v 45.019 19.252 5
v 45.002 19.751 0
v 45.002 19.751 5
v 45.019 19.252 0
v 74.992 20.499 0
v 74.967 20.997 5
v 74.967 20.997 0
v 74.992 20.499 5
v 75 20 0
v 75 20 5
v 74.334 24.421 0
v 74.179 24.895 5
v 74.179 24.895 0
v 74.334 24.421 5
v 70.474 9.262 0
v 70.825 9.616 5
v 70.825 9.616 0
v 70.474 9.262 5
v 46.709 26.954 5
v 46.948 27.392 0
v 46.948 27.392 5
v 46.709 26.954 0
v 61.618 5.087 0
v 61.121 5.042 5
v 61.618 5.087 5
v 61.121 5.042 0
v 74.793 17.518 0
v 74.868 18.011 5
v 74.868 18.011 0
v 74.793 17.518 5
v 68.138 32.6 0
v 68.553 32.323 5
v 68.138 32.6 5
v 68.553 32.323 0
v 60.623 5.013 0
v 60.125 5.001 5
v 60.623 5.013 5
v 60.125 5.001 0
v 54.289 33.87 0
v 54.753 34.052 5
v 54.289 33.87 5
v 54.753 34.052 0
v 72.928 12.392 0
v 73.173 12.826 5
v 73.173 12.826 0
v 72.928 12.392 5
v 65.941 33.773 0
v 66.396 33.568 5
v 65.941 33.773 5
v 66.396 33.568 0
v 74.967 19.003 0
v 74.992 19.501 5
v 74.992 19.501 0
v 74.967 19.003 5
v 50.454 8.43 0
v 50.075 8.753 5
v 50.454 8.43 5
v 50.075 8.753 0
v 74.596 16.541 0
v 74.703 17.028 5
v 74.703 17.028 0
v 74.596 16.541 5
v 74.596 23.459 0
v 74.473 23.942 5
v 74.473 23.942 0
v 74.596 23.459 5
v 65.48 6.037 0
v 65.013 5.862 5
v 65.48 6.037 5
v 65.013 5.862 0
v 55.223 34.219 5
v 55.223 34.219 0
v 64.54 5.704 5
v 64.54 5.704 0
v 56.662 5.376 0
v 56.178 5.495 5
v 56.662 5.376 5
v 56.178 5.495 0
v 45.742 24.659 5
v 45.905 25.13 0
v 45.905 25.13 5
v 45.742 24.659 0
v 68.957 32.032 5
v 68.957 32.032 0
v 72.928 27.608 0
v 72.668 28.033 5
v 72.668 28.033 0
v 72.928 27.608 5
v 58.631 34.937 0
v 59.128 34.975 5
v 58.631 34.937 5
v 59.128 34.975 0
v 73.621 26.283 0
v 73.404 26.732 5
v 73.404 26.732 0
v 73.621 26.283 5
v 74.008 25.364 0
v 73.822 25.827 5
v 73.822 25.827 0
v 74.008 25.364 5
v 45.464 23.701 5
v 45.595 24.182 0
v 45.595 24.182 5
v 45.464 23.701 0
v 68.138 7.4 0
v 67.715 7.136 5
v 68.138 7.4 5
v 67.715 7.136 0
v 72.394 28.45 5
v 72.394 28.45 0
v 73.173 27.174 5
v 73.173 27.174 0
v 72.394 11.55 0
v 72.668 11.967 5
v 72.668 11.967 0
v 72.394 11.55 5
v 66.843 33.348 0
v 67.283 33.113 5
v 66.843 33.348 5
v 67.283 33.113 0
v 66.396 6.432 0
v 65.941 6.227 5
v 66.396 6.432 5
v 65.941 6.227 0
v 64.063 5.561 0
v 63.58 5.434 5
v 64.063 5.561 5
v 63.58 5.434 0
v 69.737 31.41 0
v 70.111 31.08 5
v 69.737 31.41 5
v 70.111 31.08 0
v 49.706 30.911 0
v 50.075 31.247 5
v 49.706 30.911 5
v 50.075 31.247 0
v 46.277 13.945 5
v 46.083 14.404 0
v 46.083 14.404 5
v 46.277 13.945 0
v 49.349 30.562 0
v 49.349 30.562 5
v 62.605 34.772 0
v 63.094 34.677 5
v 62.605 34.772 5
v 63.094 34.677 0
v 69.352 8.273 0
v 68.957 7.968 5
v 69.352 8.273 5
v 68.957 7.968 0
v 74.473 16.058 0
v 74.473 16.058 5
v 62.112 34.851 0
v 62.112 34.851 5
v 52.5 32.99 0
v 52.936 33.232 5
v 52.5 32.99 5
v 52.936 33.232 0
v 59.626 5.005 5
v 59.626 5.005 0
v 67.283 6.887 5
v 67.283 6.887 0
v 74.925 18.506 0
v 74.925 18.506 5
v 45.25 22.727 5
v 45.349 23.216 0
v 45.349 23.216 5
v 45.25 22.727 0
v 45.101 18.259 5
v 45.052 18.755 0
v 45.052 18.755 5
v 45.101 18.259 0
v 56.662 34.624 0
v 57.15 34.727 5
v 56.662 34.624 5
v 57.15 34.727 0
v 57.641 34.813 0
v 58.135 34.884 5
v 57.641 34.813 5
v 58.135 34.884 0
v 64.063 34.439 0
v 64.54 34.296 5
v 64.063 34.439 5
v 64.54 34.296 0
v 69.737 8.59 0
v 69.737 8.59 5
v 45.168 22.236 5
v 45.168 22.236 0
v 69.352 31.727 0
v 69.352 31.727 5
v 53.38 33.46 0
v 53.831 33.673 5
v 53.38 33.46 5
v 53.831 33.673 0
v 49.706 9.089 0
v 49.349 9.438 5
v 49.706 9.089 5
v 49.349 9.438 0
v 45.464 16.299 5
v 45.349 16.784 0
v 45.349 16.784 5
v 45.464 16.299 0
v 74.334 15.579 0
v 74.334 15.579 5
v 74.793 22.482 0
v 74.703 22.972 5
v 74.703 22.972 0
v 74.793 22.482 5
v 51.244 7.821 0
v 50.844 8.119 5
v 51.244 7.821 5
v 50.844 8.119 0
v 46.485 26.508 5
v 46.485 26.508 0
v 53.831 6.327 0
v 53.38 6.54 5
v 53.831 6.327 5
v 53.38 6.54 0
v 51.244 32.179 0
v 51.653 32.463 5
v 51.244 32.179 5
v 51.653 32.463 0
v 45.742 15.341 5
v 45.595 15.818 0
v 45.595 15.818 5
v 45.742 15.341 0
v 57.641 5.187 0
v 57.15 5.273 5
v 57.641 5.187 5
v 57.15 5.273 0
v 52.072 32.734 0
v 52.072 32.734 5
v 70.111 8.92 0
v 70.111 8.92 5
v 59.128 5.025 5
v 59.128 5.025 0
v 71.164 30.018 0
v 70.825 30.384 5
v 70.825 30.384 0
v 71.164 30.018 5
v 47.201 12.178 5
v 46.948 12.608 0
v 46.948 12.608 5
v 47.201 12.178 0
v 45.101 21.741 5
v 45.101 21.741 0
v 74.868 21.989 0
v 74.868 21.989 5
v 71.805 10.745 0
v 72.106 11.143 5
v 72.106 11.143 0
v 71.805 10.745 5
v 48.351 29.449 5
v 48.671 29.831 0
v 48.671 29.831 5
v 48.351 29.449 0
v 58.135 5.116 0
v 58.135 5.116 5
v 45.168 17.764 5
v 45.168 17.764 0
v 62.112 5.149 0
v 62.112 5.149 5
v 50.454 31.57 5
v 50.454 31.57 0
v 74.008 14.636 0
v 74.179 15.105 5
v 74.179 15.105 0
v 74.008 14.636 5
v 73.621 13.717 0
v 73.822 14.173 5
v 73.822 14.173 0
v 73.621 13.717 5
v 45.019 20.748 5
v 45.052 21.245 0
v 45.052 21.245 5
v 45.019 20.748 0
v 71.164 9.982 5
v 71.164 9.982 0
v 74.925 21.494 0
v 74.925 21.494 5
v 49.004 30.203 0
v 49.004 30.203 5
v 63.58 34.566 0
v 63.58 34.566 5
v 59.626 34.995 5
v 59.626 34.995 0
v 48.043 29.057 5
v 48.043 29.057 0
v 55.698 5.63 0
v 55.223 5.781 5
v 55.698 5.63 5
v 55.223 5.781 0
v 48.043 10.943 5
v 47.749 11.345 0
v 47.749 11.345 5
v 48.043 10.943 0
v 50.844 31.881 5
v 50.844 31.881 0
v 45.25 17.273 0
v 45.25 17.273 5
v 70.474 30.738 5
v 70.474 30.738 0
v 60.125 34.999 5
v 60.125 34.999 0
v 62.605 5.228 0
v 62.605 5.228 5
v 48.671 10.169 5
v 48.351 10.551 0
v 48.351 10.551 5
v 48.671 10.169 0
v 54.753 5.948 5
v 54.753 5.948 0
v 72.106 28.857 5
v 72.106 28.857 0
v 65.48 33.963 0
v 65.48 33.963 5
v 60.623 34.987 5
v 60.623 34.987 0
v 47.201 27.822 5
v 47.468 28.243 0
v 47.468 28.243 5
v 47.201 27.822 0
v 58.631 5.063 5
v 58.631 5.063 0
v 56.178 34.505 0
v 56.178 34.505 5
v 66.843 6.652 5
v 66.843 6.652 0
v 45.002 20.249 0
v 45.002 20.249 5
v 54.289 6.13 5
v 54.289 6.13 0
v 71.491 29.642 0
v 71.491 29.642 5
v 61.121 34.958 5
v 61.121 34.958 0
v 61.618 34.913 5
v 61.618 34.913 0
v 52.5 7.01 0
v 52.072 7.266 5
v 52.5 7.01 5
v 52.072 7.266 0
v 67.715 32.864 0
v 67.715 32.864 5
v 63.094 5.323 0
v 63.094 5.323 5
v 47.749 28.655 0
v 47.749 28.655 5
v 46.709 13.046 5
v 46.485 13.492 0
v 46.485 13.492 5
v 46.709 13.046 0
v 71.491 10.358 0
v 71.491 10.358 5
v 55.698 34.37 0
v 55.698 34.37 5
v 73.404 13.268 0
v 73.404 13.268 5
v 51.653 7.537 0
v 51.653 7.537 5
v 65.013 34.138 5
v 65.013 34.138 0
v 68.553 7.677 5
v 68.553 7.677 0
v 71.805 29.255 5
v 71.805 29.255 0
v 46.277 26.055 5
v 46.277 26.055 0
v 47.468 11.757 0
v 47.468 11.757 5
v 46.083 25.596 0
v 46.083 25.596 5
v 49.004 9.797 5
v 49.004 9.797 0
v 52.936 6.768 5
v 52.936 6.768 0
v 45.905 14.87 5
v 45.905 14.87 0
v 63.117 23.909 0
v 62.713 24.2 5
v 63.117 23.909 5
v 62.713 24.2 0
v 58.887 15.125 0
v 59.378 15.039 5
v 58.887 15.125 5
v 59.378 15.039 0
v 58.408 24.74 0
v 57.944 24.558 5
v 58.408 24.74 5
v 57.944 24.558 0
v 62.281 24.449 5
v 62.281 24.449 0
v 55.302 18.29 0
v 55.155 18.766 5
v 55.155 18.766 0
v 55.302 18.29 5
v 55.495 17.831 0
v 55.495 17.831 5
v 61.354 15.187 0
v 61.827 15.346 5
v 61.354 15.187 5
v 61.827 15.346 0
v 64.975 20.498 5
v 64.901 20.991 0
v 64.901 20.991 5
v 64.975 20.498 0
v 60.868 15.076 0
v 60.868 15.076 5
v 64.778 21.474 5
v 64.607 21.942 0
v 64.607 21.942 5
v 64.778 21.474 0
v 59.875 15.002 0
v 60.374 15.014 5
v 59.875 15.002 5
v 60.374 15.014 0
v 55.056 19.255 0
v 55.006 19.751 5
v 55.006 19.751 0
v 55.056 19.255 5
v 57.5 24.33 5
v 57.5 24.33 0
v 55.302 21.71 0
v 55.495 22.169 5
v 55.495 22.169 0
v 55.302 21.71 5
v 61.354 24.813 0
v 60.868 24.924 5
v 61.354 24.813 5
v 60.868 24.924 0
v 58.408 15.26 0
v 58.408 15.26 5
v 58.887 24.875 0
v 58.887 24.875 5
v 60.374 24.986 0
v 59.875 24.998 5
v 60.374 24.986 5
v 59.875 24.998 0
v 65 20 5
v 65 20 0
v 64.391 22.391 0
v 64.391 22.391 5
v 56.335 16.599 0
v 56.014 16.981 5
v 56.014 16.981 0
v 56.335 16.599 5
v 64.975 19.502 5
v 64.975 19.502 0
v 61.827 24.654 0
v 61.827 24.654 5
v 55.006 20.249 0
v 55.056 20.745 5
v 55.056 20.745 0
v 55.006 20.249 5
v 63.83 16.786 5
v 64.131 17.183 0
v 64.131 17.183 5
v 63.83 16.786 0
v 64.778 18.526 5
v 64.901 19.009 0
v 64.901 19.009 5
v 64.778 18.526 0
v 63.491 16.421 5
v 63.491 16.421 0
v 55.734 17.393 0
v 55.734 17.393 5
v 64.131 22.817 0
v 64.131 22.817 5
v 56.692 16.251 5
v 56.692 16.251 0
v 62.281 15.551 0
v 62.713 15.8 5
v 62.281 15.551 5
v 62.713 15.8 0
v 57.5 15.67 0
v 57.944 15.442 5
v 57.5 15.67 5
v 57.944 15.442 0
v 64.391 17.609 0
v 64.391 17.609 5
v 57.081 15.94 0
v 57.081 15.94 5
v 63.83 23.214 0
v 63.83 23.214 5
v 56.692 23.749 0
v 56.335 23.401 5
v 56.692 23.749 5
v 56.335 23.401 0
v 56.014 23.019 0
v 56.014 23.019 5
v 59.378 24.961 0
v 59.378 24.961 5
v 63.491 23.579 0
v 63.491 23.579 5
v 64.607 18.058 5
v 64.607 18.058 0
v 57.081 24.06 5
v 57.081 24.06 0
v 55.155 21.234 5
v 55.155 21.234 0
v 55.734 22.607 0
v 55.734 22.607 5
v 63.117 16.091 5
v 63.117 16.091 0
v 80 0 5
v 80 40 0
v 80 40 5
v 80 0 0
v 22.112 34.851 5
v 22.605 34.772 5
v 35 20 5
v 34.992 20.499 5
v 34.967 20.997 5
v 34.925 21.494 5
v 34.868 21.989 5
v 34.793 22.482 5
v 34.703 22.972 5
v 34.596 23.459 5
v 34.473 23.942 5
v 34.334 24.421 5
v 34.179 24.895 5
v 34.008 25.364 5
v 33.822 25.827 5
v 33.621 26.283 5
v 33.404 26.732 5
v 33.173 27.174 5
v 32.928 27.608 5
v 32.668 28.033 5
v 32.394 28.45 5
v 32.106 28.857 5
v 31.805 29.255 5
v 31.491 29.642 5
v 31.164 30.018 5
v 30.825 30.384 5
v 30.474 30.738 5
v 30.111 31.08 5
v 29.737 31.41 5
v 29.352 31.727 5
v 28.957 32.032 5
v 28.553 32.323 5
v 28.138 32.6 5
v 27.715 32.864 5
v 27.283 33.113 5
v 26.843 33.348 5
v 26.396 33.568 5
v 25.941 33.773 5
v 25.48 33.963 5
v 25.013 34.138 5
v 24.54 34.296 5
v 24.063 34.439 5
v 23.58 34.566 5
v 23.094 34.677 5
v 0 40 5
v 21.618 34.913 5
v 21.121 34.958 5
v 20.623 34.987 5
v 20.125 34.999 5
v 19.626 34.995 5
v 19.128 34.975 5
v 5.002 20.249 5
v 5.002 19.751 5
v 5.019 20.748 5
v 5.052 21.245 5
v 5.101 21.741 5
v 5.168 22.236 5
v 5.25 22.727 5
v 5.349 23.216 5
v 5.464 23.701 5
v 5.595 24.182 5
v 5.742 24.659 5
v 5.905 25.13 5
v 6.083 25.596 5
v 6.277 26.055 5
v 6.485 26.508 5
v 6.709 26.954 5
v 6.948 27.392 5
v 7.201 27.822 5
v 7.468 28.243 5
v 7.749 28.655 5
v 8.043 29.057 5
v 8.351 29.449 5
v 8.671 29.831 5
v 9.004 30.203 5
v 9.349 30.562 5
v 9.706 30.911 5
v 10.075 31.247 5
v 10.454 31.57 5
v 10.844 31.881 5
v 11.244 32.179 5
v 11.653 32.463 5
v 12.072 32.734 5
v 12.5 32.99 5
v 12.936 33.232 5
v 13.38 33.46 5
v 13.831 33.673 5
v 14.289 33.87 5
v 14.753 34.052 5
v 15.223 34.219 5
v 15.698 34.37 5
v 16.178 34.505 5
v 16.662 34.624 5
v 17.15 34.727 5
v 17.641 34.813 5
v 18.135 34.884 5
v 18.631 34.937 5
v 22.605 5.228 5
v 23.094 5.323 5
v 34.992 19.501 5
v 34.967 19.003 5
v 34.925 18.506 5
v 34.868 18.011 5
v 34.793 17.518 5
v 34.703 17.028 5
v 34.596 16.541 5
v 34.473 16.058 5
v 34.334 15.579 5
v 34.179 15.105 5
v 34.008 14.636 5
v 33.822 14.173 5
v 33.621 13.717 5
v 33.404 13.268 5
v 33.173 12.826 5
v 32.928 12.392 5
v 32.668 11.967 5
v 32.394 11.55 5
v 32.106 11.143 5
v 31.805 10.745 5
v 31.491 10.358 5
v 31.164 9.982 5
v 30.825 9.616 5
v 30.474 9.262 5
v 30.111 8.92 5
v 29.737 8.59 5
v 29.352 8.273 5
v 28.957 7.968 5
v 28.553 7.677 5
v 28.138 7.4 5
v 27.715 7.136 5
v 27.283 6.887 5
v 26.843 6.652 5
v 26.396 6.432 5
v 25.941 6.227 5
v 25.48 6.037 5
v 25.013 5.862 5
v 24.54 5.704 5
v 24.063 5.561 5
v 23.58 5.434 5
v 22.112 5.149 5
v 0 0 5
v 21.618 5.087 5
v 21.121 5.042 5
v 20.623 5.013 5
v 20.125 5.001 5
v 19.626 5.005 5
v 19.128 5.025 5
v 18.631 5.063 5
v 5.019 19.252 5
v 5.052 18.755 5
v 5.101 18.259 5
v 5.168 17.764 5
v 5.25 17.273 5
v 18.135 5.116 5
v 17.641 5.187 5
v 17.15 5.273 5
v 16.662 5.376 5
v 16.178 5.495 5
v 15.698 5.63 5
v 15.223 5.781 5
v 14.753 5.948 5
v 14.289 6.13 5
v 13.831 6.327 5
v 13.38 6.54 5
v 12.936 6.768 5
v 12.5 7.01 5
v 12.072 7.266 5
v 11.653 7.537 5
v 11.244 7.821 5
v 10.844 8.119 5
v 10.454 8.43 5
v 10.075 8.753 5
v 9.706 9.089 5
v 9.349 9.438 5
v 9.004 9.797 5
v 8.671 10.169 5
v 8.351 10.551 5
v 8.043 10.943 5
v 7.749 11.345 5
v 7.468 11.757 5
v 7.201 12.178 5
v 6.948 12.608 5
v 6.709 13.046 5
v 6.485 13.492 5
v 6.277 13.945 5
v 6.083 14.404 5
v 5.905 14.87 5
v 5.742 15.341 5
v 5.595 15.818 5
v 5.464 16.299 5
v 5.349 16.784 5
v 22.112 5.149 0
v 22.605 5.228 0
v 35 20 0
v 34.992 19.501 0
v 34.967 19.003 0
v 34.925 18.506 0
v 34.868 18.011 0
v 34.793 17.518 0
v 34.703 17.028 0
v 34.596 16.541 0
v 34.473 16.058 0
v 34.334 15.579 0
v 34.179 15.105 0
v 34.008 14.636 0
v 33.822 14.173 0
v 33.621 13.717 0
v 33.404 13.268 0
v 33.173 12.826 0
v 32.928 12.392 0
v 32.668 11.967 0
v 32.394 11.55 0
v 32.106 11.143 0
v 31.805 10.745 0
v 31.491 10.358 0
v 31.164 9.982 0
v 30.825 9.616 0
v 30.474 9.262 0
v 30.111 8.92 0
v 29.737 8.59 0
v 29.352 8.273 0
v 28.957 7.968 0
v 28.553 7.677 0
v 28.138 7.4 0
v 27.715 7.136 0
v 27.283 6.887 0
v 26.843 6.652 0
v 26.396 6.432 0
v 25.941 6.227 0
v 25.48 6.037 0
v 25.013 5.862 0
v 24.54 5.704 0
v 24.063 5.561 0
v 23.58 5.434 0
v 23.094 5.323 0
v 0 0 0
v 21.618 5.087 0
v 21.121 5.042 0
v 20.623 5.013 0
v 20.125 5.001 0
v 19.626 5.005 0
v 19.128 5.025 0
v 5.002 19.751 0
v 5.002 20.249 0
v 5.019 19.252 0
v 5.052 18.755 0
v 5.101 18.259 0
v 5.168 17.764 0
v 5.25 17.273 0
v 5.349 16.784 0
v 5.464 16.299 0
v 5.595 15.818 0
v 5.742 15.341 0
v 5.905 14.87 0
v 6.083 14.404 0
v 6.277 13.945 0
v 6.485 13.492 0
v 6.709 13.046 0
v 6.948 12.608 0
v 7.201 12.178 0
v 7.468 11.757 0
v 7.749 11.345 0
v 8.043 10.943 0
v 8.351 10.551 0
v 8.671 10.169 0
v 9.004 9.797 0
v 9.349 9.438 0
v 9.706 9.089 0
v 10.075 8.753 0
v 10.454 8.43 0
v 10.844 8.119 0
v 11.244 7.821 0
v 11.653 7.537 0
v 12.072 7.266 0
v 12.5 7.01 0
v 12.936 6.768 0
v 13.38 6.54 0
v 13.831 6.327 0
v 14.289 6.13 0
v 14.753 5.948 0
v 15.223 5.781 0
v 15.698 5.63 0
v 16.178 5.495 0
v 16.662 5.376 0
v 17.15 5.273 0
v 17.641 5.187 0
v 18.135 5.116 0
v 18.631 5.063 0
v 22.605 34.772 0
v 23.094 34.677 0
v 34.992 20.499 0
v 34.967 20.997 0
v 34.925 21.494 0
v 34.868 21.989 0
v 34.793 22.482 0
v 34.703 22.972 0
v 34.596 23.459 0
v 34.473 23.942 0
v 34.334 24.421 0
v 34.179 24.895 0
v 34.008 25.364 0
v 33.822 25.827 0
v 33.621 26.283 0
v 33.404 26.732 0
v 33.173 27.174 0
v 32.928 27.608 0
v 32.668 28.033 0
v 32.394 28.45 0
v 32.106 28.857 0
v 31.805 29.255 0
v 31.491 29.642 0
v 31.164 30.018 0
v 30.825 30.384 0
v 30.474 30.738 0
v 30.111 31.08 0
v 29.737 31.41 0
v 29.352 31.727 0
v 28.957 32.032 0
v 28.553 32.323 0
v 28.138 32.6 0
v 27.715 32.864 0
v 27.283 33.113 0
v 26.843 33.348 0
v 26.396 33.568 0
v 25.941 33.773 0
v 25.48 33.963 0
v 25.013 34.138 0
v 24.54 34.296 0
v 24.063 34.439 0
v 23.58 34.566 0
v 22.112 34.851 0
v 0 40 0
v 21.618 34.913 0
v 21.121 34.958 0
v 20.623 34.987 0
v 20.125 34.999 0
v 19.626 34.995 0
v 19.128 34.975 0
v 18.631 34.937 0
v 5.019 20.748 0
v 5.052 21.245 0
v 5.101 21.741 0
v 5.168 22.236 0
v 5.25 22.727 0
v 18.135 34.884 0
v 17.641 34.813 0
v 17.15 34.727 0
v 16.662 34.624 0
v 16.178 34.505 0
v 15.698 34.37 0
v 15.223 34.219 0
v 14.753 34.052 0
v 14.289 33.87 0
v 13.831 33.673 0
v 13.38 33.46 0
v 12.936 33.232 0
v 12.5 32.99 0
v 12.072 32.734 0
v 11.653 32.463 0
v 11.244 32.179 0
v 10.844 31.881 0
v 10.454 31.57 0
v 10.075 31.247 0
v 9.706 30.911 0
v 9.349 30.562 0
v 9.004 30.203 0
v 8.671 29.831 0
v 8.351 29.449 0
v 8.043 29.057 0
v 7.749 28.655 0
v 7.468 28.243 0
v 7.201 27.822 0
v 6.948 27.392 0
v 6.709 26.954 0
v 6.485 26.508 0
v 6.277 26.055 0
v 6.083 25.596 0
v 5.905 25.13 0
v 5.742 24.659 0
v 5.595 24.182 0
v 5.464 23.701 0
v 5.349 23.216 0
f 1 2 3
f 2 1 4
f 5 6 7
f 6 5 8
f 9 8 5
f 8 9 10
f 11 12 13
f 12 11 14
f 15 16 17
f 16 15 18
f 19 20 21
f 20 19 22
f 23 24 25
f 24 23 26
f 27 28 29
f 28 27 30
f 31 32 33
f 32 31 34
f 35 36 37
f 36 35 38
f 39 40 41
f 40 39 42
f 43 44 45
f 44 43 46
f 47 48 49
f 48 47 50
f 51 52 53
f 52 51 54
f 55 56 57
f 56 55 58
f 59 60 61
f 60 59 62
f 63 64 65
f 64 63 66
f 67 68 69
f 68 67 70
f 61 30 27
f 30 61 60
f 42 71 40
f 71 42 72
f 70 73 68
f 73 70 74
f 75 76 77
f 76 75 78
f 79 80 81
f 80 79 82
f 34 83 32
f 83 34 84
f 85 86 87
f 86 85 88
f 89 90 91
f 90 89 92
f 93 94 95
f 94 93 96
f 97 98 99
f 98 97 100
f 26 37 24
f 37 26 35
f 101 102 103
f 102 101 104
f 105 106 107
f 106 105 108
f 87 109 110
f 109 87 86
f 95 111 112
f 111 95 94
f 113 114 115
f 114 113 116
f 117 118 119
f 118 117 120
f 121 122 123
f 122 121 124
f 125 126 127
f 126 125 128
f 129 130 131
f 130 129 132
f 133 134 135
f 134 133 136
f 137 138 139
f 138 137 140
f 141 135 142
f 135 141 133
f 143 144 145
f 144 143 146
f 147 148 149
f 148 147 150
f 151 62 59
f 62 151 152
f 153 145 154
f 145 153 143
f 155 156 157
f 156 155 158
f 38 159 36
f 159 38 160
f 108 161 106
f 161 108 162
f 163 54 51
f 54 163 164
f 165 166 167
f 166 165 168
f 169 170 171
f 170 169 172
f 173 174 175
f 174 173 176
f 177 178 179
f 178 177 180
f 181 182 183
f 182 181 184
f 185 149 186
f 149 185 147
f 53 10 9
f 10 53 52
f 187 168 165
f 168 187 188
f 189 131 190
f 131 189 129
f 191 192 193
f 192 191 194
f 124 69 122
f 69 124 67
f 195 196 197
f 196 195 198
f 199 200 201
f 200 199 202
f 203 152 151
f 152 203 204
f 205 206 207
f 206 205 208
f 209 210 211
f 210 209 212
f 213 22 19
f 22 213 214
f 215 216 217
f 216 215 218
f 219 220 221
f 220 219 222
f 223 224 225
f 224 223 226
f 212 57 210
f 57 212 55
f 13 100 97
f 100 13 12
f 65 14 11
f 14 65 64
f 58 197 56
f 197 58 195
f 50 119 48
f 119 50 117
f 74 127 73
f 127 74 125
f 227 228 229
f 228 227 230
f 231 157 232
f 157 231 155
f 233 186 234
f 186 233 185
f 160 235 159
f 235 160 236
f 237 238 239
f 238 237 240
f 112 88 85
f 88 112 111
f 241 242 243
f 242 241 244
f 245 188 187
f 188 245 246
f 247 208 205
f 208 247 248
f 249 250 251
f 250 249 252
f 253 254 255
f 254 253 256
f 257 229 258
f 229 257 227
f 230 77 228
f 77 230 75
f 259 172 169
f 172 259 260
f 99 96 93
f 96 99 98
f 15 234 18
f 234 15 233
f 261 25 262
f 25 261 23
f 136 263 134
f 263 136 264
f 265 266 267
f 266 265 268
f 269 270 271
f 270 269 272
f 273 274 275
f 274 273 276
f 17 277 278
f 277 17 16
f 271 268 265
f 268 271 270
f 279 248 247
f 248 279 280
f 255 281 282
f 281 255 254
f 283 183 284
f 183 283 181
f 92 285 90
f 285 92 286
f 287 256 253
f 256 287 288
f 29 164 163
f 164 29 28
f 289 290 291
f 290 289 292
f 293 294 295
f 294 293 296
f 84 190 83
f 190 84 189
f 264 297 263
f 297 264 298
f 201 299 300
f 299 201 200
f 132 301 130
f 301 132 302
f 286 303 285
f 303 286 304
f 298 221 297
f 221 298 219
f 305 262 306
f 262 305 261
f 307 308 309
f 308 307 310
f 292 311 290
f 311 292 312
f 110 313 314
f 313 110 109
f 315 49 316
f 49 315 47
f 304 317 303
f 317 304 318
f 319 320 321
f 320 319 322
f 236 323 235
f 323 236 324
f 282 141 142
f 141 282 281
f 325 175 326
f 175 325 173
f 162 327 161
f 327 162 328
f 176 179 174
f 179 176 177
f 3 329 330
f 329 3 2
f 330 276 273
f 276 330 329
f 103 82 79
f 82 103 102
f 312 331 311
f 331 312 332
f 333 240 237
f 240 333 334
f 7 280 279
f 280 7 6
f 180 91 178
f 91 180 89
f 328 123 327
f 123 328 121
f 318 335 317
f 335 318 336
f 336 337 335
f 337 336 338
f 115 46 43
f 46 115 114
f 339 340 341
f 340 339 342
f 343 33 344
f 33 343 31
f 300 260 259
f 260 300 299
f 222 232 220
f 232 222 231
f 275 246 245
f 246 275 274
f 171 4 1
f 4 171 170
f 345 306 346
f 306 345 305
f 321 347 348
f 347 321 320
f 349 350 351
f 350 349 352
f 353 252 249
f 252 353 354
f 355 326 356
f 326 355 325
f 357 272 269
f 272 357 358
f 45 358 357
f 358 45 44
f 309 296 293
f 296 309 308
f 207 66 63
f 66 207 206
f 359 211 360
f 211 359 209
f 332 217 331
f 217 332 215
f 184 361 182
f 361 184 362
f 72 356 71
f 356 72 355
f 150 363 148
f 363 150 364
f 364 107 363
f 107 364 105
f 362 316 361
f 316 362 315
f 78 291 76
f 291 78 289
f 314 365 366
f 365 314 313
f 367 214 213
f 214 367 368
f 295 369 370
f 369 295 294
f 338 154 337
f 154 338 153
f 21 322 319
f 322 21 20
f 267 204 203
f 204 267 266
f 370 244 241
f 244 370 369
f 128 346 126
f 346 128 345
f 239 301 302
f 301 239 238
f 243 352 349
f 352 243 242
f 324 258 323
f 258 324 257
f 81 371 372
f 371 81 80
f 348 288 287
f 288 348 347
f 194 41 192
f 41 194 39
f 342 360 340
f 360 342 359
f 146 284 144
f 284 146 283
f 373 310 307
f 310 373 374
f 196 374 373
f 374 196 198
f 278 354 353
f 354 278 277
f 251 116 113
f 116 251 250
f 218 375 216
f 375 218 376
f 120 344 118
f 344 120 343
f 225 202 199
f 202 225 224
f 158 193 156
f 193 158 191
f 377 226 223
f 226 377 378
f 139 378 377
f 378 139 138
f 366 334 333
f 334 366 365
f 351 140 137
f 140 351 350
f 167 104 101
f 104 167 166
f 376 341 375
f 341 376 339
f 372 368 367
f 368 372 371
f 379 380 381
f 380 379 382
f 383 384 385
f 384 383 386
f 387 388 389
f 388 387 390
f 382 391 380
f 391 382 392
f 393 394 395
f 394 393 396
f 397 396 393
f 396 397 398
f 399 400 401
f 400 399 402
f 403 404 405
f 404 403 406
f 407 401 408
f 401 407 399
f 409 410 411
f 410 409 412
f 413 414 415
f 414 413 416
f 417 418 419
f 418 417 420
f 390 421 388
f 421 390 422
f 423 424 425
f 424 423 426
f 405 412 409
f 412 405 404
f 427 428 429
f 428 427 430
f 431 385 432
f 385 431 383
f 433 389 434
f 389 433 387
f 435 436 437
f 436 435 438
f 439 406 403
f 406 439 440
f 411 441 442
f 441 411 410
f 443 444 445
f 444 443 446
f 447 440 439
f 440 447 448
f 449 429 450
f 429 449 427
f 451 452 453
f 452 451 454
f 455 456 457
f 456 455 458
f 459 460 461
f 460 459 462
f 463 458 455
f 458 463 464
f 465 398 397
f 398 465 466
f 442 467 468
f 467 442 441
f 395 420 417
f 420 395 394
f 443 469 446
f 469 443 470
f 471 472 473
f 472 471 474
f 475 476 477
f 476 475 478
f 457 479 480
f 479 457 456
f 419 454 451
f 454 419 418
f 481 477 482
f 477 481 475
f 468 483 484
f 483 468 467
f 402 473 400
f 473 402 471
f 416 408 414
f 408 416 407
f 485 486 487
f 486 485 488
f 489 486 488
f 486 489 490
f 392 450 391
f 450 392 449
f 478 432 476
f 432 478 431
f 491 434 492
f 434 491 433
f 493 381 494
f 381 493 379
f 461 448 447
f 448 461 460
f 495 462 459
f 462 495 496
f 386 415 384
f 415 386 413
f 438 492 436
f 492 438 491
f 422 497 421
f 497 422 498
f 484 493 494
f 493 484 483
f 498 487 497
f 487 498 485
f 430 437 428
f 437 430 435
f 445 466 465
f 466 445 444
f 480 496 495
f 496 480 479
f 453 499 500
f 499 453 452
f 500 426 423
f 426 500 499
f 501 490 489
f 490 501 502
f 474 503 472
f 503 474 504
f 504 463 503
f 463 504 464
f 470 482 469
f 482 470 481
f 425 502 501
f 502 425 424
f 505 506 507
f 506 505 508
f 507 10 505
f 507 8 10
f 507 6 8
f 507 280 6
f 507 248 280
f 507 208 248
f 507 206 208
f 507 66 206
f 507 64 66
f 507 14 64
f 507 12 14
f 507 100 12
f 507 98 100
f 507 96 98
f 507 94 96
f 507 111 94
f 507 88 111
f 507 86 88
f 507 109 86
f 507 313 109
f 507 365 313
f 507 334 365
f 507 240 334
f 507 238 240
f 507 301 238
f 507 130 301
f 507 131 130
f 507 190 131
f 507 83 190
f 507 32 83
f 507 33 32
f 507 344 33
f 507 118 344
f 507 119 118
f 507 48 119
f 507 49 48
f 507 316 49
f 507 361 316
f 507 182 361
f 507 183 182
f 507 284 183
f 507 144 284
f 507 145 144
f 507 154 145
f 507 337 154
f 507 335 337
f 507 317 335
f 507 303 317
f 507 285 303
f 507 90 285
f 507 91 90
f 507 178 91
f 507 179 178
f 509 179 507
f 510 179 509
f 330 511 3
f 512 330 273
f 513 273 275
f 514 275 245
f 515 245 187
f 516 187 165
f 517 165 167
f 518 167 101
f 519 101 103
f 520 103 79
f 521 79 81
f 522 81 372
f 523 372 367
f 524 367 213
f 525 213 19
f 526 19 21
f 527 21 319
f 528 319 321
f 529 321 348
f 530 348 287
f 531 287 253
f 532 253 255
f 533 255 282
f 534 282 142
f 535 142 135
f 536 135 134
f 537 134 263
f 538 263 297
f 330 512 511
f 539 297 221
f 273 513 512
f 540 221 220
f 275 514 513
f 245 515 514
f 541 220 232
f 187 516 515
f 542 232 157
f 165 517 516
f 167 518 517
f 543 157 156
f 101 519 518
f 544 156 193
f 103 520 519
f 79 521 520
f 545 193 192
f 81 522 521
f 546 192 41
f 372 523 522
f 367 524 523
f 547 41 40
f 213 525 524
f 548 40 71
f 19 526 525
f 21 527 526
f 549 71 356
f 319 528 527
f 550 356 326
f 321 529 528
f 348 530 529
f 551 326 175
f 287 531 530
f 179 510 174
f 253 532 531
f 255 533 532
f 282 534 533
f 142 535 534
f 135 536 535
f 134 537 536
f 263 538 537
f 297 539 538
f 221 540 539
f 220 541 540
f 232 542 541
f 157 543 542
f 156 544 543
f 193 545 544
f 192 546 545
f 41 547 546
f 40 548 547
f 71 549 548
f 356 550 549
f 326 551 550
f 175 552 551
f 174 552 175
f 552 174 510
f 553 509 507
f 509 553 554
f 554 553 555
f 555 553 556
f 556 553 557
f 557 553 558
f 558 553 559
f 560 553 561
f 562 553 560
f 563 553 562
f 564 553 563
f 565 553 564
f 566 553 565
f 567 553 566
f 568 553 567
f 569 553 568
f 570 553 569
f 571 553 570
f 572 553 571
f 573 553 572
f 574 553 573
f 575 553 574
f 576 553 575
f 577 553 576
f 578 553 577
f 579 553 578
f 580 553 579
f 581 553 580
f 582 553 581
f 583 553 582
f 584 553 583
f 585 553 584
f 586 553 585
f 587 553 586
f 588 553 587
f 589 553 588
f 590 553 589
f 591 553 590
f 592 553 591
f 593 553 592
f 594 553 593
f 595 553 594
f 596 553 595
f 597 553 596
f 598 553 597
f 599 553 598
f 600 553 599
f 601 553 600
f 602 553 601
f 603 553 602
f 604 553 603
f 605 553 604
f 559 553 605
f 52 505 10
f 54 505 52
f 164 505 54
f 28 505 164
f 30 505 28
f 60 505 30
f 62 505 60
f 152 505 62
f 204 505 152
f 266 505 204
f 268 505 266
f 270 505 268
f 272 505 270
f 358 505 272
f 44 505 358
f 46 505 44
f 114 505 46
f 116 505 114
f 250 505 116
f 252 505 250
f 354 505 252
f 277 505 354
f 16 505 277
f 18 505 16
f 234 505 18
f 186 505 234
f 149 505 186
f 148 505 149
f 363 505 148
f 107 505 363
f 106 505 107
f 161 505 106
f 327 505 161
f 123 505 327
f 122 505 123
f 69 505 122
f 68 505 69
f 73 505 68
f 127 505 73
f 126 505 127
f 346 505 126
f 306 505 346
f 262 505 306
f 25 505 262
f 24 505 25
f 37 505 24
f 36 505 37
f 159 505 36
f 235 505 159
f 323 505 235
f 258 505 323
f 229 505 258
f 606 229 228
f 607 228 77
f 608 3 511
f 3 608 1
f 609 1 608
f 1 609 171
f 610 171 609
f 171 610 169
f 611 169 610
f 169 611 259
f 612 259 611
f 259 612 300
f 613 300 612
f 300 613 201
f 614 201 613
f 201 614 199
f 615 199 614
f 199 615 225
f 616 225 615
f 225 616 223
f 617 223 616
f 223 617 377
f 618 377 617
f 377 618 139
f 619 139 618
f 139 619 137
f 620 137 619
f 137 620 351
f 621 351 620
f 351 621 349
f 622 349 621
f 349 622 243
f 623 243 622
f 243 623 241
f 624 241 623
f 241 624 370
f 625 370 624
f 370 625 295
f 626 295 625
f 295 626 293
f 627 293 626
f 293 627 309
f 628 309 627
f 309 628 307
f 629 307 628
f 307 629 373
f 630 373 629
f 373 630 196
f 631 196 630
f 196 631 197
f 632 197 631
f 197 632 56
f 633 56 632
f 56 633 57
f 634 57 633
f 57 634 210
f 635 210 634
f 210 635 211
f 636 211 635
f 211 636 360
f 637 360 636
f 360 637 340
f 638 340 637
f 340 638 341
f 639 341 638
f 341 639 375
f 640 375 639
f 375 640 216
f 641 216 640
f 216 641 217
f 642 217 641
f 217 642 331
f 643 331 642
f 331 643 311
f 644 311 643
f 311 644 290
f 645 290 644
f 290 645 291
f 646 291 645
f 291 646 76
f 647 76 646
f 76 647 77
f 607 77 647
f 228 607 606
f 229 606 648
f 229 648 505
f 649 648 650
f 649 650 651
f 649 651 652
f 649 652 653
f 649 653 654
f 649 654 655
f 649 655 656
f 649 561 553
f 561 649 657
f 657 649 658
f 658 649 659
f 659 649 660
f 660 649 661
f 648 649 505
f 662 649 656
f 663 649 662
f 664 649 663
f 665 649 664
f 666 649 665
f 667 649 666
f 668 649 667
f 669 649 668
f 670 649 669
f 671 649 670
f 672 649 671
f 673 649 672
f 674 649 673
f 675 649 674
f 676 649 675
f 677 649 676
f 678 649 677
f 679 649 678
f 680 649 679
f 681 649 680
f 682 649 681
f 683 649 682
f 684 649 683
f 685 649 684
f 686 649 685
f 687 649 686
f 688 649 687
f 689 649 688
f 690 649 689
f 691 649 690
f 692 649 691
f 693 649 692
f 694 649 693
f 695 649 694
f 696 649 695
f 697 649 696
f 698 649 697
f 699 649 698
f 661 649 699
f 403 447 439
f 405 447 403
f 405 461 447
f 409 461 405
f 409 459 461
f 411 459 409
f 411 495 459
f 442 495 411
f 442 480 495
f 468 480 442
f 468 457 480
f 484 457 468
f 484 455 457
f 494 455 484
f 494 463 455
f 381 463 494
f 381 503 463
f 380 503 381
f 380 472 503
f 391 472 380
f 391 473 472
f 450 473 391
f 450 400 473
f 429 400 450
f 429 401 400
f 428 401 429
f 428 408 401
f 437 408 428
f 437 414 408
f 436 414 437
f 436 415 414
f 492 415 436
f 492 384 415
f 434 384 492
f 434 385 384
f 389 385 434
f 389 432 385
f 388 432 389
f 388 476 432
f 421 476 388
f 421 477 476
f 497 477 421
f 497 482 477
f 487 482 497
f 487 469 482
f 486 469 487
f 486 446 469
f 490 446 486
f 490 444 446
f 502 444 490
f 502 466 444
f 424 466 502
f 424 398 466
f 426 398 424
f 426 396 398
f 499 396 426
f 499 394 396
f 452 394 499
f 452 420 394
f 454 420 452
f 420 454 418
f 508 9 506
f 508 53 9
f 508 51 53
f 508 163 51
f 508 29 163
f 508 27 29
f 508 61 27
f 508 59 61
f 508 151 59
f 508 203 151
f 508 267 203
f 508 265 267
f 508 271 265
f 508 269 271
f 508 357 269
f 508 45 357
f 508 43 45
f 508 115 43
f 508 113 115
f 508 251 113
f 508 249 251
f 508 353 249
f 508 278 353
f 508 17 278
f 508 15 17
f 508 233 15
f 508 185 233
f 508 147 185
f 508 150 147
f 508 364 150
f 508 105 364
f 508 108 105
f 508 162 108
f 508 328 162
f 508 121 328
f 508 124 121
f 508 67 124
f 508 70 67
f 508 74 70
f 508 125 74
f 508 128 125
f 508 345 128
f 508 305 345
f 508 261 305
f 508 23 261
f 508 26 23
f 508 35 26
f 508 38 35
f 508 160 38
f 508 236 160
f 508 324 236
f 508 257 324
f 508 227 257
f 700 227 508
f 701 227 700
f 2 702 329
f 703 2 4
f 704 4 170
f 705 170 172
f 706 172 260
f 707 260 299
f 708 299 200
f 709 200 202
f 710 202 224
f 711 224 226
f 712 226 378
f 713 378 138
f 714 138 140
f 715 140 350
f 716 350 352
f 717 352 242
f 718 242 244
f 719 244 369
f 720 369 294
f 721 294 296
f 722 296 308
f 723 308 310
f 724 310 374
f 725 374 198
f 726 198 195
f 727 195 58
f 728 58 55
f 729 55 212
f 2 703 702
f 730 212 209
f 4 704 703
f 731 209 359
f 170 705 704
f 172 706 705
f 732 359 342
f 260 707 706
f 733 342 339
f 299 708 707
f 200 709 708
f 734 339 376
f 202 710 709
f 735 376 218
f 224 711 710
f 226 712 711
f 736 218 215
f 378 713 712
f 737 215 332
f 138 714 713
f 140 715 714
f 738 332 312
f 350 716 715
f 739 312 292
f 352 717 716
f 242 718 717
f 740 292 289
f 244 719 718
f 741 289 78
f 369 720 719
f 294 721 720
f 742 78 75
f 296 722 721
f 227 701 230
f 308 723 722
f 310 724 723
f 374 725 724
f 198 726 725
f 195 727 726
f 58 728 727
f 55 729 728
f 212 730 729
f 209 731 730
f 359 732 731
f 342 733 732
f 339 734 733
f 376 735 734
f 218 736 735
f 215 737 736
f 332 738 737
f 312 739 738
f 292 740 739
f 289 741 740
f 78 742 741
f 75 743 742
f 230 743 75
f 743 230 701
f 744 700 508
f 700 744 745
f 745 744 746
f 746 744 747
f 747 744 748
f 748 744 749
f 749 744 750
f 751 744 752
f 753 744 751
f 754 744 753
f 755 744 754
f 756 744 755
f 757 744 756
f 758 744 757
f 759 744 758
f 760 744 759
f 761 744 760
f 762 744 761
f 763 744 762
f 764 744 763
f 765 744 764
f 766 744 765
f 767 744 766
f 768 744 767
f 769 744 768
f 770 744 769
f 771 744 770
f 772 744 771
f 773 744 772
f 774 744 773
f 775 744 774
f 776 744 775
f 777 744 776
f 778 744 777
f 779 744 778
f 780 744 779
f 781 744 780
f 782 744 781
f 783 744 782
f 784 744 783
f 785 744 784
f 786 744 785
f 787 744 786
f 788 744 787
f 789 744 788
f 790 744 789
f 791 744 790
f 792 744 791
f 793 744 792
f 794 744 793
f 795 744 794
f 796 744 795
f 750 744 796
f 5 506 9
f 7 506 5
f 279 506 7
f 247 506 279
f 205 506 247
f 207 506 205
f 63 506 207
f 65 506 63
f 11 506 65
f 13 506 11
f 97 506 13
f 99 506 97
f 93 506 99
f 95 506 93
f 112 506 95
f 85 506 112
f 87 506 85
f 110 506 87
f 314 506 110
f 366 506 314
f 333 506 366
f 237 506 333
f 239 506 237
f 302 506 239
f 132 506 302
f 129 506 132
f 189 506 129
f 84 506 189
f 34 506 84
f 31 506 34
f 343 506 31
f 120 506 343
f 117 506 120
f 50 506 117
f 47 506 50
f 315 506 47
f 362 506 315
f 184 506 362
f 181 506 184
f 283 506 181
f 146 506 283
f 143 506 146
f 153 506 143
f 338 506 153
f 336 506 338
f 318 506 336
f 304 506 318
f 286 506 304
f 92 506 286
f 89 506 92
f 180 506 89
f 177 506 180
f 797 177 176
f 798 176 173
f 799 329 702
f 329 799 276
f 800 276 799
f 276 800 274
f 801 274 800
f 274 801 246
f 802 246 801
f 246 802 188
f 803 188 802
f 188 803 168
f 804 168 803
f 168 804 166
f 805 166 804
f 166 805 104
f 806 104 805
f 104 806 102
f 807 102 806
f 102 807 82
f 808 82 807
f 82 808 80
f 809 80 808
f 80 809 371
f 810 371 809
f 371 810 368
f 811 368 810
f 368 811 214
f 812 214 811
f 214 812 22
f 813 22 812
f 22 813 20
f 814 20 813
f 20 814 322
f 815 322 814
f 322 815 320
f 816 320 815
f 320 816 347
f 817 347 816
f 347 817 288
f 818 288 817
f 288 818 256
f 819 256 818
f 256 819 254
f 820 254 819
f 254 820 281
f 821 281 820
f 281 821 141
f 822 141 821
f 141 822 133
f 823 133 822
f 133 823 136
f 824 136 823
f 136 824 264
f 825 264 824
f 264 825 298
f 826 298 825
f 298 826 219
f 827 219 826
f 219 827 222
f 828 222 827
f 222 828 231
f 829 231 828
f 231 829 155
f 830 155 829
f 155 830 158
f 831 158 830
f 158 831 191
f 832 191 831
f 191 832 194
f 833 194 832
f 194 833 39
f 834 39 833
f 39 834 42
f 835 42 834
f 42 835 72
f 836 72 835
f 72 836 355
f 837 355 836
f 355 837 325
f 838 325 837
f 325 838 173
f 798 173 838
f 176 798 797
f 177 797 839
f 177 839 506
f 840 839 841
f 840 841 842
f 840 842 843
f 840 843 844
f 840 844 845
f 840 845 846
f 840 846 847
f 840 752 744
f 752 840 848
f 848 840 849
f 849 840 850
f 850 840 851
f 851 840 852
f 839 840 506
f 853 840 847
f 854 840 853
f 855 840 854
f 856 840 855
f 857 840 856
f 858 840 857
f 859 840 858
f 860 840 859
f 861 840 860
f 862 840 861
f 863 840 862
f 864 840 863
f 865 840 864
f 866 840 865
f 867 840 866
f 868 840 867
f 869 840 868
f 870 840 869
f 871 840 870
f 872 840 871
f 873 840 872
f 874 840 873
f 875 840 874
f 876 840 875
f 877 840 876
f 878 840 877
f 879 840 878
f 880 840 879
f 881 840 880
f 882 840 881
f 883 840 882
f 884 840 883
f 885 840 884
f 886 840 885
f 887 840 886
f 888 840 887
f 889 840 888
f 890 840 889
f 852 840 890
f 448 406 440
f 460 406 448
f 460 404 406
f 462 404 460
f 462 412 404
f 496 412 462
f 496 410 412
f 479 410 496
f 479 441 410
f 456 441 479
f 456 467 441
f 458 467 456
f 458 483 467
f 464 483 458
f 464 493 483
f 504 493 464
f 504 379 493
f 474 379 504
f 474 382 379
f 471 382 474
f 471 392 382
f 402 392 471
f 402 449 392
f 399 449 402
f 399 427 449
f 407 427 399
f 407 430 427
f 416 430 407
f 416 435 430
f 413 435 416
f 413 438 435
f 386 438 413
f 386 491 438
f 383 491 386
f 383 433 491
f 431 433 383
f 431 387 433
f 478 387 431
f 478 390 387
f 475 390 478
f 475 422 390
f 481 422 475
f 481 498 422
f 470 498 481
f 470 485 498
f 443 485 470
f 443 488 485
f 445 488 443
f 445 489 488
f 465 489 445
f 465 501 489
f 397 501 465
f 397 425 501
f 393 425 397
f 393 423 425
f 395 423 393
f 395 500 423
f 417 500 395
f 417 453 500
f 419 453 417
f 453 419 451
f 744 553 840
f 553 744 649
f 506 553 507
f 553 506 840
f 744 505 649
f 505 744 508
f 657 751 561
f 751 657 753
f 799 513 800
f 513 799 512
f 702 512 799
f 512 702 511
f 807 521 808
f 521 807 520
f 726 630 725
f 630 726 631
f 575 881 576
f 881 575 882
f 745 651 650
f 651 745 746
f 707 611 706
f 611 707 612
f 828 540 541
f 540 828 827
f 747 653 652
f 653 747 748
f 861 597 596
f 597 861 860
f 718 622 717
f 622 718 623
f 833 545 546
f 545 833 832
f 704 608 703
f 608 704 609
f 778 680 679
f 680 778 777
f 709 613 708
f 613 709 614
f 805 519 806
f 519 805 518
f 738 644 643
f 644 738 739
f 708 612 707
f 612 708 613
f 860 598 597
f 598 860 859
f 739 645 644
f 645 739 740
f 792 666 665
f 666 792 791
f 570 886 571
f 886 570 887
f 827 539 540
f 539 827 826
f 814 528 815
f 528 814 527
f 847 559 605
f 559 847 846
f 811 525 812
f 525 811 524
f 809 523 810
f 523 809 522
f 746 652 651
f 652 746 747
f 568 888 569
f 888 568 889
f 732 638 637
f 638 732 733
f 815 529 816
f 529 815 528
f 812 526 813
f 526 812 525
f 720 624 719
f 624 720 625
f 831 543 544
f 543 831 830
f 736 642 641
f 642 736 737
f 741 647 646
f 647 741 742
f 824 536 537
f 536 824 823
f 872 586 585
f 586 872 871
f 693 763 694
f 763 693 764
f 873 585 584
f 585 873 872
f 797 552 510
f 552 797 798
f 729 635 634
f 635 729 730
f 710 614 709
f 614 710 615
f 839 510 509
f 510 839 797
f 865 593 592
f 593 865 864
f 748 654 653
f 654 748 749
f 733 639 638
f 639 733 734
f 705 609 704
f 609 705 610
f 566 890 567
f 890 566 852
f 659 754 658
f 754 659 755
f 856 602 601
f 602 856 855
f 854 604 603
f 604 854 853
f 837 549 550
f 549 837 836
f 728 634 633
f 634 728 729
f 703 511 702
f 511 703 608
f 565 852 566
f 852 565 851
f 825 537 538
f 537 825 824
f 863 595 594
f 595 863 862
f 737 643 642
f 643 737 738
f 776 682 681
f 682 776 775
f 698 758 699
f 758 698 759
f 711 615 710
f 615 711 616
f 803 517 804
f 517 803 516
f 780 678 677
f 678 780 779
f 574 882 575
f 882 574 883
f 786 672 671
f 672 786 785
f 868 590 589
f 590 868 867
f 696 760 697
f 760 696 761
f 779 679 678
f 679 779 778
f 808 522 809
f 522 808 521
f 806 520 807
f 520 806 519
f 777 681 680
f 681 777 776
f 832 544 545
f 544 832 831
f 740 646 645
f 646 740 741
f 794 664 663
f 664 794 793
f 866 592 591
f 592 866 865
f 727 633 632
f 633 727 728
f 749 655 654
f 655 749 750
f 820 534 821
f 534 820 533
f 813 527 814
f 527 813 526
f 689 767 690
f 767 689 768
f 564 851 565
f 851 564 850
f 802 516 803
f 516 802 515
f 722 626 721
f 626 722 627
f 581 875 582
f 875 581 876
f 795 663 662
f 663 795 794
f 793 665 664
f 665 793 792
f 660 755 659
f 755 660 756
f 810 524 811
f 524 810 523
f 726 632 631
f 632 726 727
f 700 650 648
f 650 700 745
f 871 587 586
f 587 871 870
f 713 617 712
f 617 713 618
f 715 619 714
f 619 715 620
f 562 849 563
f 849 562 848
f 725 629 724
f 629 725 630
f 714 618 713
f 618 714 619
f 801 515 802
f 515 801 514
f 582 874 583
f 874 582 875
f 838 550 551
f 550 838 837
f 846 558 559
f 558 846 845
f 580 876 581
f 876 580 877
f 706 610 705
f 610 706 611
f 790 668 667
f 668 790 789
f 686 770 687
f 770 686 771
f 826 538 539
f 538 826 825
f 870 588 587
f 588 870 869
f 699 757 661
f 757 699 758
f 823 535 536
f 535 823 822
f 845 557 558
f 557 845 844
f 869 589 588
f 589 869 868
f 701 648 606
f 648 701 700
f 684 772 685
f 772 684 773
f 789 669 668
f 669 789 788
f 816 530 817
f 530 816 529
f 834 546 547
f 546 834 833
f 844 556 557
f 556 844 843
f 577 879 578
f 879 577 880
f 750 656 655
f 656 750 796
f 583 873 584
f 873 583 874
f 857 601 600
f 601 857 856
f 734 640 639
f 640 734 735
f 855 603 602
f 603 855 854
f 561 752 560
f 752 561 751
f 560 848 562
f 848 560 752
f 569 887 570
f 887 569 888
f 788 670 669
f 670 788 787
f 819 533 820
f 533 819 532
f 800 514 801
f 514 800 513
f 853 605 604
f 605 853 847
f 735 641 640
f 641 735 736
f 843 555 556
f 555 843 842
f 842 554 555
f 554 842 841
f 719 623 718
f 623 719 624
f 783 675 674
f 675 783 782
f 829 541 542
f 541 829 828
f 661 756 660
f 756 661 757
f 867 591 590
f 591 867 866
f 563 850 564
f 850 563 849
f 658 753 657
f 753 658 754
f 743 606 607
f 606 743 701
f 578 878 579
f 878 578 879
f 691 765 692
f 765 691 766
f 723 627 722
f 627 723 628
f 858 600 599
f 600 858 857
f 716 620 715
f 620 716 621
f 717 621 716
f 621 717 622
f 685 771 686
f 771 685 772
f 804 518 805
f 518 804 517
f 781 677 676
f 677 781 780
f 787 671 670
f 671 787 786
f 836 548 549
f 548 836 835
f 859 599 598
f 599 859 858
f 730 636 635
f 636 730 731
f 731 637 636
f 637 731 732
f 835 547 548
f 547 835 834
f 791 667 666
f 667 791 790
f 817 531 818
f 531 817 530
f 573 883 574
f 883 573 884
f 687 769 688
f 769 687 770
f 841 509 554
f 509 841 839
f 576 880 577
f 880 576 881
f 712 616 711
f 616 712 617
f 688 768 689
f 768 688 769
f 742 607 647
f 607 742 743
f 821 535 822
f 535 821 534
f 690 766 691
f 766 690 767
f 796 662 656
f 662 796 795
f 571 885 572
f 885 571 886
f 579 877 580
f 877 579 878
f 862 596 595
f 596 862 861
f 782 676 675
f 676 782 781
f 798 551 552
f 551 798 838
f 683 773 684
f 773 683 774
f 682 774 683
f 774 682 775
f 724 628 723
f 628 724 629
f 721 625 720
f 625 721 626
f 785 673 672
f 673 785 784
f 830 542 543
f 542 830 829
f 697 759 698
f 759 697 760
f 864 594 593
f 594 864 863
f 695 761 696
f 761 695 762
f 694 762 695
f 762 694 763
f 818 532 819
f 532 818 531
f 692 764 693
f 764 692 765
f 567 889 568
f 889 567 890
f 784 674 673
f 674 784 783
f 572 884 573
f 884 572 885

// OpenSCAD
$fs = 0.5;
$fa = 1;

difference() {
	cube([80, 40, 5]);
	translate([20, 20, -1]) {
		cylinder(r=15, h=7);
	}
	translate([60, 20, -1]) {
		difference() {
			cylinder(r=15, h=7);
			cylinder(r=5, h=7);
		}
	}
}
